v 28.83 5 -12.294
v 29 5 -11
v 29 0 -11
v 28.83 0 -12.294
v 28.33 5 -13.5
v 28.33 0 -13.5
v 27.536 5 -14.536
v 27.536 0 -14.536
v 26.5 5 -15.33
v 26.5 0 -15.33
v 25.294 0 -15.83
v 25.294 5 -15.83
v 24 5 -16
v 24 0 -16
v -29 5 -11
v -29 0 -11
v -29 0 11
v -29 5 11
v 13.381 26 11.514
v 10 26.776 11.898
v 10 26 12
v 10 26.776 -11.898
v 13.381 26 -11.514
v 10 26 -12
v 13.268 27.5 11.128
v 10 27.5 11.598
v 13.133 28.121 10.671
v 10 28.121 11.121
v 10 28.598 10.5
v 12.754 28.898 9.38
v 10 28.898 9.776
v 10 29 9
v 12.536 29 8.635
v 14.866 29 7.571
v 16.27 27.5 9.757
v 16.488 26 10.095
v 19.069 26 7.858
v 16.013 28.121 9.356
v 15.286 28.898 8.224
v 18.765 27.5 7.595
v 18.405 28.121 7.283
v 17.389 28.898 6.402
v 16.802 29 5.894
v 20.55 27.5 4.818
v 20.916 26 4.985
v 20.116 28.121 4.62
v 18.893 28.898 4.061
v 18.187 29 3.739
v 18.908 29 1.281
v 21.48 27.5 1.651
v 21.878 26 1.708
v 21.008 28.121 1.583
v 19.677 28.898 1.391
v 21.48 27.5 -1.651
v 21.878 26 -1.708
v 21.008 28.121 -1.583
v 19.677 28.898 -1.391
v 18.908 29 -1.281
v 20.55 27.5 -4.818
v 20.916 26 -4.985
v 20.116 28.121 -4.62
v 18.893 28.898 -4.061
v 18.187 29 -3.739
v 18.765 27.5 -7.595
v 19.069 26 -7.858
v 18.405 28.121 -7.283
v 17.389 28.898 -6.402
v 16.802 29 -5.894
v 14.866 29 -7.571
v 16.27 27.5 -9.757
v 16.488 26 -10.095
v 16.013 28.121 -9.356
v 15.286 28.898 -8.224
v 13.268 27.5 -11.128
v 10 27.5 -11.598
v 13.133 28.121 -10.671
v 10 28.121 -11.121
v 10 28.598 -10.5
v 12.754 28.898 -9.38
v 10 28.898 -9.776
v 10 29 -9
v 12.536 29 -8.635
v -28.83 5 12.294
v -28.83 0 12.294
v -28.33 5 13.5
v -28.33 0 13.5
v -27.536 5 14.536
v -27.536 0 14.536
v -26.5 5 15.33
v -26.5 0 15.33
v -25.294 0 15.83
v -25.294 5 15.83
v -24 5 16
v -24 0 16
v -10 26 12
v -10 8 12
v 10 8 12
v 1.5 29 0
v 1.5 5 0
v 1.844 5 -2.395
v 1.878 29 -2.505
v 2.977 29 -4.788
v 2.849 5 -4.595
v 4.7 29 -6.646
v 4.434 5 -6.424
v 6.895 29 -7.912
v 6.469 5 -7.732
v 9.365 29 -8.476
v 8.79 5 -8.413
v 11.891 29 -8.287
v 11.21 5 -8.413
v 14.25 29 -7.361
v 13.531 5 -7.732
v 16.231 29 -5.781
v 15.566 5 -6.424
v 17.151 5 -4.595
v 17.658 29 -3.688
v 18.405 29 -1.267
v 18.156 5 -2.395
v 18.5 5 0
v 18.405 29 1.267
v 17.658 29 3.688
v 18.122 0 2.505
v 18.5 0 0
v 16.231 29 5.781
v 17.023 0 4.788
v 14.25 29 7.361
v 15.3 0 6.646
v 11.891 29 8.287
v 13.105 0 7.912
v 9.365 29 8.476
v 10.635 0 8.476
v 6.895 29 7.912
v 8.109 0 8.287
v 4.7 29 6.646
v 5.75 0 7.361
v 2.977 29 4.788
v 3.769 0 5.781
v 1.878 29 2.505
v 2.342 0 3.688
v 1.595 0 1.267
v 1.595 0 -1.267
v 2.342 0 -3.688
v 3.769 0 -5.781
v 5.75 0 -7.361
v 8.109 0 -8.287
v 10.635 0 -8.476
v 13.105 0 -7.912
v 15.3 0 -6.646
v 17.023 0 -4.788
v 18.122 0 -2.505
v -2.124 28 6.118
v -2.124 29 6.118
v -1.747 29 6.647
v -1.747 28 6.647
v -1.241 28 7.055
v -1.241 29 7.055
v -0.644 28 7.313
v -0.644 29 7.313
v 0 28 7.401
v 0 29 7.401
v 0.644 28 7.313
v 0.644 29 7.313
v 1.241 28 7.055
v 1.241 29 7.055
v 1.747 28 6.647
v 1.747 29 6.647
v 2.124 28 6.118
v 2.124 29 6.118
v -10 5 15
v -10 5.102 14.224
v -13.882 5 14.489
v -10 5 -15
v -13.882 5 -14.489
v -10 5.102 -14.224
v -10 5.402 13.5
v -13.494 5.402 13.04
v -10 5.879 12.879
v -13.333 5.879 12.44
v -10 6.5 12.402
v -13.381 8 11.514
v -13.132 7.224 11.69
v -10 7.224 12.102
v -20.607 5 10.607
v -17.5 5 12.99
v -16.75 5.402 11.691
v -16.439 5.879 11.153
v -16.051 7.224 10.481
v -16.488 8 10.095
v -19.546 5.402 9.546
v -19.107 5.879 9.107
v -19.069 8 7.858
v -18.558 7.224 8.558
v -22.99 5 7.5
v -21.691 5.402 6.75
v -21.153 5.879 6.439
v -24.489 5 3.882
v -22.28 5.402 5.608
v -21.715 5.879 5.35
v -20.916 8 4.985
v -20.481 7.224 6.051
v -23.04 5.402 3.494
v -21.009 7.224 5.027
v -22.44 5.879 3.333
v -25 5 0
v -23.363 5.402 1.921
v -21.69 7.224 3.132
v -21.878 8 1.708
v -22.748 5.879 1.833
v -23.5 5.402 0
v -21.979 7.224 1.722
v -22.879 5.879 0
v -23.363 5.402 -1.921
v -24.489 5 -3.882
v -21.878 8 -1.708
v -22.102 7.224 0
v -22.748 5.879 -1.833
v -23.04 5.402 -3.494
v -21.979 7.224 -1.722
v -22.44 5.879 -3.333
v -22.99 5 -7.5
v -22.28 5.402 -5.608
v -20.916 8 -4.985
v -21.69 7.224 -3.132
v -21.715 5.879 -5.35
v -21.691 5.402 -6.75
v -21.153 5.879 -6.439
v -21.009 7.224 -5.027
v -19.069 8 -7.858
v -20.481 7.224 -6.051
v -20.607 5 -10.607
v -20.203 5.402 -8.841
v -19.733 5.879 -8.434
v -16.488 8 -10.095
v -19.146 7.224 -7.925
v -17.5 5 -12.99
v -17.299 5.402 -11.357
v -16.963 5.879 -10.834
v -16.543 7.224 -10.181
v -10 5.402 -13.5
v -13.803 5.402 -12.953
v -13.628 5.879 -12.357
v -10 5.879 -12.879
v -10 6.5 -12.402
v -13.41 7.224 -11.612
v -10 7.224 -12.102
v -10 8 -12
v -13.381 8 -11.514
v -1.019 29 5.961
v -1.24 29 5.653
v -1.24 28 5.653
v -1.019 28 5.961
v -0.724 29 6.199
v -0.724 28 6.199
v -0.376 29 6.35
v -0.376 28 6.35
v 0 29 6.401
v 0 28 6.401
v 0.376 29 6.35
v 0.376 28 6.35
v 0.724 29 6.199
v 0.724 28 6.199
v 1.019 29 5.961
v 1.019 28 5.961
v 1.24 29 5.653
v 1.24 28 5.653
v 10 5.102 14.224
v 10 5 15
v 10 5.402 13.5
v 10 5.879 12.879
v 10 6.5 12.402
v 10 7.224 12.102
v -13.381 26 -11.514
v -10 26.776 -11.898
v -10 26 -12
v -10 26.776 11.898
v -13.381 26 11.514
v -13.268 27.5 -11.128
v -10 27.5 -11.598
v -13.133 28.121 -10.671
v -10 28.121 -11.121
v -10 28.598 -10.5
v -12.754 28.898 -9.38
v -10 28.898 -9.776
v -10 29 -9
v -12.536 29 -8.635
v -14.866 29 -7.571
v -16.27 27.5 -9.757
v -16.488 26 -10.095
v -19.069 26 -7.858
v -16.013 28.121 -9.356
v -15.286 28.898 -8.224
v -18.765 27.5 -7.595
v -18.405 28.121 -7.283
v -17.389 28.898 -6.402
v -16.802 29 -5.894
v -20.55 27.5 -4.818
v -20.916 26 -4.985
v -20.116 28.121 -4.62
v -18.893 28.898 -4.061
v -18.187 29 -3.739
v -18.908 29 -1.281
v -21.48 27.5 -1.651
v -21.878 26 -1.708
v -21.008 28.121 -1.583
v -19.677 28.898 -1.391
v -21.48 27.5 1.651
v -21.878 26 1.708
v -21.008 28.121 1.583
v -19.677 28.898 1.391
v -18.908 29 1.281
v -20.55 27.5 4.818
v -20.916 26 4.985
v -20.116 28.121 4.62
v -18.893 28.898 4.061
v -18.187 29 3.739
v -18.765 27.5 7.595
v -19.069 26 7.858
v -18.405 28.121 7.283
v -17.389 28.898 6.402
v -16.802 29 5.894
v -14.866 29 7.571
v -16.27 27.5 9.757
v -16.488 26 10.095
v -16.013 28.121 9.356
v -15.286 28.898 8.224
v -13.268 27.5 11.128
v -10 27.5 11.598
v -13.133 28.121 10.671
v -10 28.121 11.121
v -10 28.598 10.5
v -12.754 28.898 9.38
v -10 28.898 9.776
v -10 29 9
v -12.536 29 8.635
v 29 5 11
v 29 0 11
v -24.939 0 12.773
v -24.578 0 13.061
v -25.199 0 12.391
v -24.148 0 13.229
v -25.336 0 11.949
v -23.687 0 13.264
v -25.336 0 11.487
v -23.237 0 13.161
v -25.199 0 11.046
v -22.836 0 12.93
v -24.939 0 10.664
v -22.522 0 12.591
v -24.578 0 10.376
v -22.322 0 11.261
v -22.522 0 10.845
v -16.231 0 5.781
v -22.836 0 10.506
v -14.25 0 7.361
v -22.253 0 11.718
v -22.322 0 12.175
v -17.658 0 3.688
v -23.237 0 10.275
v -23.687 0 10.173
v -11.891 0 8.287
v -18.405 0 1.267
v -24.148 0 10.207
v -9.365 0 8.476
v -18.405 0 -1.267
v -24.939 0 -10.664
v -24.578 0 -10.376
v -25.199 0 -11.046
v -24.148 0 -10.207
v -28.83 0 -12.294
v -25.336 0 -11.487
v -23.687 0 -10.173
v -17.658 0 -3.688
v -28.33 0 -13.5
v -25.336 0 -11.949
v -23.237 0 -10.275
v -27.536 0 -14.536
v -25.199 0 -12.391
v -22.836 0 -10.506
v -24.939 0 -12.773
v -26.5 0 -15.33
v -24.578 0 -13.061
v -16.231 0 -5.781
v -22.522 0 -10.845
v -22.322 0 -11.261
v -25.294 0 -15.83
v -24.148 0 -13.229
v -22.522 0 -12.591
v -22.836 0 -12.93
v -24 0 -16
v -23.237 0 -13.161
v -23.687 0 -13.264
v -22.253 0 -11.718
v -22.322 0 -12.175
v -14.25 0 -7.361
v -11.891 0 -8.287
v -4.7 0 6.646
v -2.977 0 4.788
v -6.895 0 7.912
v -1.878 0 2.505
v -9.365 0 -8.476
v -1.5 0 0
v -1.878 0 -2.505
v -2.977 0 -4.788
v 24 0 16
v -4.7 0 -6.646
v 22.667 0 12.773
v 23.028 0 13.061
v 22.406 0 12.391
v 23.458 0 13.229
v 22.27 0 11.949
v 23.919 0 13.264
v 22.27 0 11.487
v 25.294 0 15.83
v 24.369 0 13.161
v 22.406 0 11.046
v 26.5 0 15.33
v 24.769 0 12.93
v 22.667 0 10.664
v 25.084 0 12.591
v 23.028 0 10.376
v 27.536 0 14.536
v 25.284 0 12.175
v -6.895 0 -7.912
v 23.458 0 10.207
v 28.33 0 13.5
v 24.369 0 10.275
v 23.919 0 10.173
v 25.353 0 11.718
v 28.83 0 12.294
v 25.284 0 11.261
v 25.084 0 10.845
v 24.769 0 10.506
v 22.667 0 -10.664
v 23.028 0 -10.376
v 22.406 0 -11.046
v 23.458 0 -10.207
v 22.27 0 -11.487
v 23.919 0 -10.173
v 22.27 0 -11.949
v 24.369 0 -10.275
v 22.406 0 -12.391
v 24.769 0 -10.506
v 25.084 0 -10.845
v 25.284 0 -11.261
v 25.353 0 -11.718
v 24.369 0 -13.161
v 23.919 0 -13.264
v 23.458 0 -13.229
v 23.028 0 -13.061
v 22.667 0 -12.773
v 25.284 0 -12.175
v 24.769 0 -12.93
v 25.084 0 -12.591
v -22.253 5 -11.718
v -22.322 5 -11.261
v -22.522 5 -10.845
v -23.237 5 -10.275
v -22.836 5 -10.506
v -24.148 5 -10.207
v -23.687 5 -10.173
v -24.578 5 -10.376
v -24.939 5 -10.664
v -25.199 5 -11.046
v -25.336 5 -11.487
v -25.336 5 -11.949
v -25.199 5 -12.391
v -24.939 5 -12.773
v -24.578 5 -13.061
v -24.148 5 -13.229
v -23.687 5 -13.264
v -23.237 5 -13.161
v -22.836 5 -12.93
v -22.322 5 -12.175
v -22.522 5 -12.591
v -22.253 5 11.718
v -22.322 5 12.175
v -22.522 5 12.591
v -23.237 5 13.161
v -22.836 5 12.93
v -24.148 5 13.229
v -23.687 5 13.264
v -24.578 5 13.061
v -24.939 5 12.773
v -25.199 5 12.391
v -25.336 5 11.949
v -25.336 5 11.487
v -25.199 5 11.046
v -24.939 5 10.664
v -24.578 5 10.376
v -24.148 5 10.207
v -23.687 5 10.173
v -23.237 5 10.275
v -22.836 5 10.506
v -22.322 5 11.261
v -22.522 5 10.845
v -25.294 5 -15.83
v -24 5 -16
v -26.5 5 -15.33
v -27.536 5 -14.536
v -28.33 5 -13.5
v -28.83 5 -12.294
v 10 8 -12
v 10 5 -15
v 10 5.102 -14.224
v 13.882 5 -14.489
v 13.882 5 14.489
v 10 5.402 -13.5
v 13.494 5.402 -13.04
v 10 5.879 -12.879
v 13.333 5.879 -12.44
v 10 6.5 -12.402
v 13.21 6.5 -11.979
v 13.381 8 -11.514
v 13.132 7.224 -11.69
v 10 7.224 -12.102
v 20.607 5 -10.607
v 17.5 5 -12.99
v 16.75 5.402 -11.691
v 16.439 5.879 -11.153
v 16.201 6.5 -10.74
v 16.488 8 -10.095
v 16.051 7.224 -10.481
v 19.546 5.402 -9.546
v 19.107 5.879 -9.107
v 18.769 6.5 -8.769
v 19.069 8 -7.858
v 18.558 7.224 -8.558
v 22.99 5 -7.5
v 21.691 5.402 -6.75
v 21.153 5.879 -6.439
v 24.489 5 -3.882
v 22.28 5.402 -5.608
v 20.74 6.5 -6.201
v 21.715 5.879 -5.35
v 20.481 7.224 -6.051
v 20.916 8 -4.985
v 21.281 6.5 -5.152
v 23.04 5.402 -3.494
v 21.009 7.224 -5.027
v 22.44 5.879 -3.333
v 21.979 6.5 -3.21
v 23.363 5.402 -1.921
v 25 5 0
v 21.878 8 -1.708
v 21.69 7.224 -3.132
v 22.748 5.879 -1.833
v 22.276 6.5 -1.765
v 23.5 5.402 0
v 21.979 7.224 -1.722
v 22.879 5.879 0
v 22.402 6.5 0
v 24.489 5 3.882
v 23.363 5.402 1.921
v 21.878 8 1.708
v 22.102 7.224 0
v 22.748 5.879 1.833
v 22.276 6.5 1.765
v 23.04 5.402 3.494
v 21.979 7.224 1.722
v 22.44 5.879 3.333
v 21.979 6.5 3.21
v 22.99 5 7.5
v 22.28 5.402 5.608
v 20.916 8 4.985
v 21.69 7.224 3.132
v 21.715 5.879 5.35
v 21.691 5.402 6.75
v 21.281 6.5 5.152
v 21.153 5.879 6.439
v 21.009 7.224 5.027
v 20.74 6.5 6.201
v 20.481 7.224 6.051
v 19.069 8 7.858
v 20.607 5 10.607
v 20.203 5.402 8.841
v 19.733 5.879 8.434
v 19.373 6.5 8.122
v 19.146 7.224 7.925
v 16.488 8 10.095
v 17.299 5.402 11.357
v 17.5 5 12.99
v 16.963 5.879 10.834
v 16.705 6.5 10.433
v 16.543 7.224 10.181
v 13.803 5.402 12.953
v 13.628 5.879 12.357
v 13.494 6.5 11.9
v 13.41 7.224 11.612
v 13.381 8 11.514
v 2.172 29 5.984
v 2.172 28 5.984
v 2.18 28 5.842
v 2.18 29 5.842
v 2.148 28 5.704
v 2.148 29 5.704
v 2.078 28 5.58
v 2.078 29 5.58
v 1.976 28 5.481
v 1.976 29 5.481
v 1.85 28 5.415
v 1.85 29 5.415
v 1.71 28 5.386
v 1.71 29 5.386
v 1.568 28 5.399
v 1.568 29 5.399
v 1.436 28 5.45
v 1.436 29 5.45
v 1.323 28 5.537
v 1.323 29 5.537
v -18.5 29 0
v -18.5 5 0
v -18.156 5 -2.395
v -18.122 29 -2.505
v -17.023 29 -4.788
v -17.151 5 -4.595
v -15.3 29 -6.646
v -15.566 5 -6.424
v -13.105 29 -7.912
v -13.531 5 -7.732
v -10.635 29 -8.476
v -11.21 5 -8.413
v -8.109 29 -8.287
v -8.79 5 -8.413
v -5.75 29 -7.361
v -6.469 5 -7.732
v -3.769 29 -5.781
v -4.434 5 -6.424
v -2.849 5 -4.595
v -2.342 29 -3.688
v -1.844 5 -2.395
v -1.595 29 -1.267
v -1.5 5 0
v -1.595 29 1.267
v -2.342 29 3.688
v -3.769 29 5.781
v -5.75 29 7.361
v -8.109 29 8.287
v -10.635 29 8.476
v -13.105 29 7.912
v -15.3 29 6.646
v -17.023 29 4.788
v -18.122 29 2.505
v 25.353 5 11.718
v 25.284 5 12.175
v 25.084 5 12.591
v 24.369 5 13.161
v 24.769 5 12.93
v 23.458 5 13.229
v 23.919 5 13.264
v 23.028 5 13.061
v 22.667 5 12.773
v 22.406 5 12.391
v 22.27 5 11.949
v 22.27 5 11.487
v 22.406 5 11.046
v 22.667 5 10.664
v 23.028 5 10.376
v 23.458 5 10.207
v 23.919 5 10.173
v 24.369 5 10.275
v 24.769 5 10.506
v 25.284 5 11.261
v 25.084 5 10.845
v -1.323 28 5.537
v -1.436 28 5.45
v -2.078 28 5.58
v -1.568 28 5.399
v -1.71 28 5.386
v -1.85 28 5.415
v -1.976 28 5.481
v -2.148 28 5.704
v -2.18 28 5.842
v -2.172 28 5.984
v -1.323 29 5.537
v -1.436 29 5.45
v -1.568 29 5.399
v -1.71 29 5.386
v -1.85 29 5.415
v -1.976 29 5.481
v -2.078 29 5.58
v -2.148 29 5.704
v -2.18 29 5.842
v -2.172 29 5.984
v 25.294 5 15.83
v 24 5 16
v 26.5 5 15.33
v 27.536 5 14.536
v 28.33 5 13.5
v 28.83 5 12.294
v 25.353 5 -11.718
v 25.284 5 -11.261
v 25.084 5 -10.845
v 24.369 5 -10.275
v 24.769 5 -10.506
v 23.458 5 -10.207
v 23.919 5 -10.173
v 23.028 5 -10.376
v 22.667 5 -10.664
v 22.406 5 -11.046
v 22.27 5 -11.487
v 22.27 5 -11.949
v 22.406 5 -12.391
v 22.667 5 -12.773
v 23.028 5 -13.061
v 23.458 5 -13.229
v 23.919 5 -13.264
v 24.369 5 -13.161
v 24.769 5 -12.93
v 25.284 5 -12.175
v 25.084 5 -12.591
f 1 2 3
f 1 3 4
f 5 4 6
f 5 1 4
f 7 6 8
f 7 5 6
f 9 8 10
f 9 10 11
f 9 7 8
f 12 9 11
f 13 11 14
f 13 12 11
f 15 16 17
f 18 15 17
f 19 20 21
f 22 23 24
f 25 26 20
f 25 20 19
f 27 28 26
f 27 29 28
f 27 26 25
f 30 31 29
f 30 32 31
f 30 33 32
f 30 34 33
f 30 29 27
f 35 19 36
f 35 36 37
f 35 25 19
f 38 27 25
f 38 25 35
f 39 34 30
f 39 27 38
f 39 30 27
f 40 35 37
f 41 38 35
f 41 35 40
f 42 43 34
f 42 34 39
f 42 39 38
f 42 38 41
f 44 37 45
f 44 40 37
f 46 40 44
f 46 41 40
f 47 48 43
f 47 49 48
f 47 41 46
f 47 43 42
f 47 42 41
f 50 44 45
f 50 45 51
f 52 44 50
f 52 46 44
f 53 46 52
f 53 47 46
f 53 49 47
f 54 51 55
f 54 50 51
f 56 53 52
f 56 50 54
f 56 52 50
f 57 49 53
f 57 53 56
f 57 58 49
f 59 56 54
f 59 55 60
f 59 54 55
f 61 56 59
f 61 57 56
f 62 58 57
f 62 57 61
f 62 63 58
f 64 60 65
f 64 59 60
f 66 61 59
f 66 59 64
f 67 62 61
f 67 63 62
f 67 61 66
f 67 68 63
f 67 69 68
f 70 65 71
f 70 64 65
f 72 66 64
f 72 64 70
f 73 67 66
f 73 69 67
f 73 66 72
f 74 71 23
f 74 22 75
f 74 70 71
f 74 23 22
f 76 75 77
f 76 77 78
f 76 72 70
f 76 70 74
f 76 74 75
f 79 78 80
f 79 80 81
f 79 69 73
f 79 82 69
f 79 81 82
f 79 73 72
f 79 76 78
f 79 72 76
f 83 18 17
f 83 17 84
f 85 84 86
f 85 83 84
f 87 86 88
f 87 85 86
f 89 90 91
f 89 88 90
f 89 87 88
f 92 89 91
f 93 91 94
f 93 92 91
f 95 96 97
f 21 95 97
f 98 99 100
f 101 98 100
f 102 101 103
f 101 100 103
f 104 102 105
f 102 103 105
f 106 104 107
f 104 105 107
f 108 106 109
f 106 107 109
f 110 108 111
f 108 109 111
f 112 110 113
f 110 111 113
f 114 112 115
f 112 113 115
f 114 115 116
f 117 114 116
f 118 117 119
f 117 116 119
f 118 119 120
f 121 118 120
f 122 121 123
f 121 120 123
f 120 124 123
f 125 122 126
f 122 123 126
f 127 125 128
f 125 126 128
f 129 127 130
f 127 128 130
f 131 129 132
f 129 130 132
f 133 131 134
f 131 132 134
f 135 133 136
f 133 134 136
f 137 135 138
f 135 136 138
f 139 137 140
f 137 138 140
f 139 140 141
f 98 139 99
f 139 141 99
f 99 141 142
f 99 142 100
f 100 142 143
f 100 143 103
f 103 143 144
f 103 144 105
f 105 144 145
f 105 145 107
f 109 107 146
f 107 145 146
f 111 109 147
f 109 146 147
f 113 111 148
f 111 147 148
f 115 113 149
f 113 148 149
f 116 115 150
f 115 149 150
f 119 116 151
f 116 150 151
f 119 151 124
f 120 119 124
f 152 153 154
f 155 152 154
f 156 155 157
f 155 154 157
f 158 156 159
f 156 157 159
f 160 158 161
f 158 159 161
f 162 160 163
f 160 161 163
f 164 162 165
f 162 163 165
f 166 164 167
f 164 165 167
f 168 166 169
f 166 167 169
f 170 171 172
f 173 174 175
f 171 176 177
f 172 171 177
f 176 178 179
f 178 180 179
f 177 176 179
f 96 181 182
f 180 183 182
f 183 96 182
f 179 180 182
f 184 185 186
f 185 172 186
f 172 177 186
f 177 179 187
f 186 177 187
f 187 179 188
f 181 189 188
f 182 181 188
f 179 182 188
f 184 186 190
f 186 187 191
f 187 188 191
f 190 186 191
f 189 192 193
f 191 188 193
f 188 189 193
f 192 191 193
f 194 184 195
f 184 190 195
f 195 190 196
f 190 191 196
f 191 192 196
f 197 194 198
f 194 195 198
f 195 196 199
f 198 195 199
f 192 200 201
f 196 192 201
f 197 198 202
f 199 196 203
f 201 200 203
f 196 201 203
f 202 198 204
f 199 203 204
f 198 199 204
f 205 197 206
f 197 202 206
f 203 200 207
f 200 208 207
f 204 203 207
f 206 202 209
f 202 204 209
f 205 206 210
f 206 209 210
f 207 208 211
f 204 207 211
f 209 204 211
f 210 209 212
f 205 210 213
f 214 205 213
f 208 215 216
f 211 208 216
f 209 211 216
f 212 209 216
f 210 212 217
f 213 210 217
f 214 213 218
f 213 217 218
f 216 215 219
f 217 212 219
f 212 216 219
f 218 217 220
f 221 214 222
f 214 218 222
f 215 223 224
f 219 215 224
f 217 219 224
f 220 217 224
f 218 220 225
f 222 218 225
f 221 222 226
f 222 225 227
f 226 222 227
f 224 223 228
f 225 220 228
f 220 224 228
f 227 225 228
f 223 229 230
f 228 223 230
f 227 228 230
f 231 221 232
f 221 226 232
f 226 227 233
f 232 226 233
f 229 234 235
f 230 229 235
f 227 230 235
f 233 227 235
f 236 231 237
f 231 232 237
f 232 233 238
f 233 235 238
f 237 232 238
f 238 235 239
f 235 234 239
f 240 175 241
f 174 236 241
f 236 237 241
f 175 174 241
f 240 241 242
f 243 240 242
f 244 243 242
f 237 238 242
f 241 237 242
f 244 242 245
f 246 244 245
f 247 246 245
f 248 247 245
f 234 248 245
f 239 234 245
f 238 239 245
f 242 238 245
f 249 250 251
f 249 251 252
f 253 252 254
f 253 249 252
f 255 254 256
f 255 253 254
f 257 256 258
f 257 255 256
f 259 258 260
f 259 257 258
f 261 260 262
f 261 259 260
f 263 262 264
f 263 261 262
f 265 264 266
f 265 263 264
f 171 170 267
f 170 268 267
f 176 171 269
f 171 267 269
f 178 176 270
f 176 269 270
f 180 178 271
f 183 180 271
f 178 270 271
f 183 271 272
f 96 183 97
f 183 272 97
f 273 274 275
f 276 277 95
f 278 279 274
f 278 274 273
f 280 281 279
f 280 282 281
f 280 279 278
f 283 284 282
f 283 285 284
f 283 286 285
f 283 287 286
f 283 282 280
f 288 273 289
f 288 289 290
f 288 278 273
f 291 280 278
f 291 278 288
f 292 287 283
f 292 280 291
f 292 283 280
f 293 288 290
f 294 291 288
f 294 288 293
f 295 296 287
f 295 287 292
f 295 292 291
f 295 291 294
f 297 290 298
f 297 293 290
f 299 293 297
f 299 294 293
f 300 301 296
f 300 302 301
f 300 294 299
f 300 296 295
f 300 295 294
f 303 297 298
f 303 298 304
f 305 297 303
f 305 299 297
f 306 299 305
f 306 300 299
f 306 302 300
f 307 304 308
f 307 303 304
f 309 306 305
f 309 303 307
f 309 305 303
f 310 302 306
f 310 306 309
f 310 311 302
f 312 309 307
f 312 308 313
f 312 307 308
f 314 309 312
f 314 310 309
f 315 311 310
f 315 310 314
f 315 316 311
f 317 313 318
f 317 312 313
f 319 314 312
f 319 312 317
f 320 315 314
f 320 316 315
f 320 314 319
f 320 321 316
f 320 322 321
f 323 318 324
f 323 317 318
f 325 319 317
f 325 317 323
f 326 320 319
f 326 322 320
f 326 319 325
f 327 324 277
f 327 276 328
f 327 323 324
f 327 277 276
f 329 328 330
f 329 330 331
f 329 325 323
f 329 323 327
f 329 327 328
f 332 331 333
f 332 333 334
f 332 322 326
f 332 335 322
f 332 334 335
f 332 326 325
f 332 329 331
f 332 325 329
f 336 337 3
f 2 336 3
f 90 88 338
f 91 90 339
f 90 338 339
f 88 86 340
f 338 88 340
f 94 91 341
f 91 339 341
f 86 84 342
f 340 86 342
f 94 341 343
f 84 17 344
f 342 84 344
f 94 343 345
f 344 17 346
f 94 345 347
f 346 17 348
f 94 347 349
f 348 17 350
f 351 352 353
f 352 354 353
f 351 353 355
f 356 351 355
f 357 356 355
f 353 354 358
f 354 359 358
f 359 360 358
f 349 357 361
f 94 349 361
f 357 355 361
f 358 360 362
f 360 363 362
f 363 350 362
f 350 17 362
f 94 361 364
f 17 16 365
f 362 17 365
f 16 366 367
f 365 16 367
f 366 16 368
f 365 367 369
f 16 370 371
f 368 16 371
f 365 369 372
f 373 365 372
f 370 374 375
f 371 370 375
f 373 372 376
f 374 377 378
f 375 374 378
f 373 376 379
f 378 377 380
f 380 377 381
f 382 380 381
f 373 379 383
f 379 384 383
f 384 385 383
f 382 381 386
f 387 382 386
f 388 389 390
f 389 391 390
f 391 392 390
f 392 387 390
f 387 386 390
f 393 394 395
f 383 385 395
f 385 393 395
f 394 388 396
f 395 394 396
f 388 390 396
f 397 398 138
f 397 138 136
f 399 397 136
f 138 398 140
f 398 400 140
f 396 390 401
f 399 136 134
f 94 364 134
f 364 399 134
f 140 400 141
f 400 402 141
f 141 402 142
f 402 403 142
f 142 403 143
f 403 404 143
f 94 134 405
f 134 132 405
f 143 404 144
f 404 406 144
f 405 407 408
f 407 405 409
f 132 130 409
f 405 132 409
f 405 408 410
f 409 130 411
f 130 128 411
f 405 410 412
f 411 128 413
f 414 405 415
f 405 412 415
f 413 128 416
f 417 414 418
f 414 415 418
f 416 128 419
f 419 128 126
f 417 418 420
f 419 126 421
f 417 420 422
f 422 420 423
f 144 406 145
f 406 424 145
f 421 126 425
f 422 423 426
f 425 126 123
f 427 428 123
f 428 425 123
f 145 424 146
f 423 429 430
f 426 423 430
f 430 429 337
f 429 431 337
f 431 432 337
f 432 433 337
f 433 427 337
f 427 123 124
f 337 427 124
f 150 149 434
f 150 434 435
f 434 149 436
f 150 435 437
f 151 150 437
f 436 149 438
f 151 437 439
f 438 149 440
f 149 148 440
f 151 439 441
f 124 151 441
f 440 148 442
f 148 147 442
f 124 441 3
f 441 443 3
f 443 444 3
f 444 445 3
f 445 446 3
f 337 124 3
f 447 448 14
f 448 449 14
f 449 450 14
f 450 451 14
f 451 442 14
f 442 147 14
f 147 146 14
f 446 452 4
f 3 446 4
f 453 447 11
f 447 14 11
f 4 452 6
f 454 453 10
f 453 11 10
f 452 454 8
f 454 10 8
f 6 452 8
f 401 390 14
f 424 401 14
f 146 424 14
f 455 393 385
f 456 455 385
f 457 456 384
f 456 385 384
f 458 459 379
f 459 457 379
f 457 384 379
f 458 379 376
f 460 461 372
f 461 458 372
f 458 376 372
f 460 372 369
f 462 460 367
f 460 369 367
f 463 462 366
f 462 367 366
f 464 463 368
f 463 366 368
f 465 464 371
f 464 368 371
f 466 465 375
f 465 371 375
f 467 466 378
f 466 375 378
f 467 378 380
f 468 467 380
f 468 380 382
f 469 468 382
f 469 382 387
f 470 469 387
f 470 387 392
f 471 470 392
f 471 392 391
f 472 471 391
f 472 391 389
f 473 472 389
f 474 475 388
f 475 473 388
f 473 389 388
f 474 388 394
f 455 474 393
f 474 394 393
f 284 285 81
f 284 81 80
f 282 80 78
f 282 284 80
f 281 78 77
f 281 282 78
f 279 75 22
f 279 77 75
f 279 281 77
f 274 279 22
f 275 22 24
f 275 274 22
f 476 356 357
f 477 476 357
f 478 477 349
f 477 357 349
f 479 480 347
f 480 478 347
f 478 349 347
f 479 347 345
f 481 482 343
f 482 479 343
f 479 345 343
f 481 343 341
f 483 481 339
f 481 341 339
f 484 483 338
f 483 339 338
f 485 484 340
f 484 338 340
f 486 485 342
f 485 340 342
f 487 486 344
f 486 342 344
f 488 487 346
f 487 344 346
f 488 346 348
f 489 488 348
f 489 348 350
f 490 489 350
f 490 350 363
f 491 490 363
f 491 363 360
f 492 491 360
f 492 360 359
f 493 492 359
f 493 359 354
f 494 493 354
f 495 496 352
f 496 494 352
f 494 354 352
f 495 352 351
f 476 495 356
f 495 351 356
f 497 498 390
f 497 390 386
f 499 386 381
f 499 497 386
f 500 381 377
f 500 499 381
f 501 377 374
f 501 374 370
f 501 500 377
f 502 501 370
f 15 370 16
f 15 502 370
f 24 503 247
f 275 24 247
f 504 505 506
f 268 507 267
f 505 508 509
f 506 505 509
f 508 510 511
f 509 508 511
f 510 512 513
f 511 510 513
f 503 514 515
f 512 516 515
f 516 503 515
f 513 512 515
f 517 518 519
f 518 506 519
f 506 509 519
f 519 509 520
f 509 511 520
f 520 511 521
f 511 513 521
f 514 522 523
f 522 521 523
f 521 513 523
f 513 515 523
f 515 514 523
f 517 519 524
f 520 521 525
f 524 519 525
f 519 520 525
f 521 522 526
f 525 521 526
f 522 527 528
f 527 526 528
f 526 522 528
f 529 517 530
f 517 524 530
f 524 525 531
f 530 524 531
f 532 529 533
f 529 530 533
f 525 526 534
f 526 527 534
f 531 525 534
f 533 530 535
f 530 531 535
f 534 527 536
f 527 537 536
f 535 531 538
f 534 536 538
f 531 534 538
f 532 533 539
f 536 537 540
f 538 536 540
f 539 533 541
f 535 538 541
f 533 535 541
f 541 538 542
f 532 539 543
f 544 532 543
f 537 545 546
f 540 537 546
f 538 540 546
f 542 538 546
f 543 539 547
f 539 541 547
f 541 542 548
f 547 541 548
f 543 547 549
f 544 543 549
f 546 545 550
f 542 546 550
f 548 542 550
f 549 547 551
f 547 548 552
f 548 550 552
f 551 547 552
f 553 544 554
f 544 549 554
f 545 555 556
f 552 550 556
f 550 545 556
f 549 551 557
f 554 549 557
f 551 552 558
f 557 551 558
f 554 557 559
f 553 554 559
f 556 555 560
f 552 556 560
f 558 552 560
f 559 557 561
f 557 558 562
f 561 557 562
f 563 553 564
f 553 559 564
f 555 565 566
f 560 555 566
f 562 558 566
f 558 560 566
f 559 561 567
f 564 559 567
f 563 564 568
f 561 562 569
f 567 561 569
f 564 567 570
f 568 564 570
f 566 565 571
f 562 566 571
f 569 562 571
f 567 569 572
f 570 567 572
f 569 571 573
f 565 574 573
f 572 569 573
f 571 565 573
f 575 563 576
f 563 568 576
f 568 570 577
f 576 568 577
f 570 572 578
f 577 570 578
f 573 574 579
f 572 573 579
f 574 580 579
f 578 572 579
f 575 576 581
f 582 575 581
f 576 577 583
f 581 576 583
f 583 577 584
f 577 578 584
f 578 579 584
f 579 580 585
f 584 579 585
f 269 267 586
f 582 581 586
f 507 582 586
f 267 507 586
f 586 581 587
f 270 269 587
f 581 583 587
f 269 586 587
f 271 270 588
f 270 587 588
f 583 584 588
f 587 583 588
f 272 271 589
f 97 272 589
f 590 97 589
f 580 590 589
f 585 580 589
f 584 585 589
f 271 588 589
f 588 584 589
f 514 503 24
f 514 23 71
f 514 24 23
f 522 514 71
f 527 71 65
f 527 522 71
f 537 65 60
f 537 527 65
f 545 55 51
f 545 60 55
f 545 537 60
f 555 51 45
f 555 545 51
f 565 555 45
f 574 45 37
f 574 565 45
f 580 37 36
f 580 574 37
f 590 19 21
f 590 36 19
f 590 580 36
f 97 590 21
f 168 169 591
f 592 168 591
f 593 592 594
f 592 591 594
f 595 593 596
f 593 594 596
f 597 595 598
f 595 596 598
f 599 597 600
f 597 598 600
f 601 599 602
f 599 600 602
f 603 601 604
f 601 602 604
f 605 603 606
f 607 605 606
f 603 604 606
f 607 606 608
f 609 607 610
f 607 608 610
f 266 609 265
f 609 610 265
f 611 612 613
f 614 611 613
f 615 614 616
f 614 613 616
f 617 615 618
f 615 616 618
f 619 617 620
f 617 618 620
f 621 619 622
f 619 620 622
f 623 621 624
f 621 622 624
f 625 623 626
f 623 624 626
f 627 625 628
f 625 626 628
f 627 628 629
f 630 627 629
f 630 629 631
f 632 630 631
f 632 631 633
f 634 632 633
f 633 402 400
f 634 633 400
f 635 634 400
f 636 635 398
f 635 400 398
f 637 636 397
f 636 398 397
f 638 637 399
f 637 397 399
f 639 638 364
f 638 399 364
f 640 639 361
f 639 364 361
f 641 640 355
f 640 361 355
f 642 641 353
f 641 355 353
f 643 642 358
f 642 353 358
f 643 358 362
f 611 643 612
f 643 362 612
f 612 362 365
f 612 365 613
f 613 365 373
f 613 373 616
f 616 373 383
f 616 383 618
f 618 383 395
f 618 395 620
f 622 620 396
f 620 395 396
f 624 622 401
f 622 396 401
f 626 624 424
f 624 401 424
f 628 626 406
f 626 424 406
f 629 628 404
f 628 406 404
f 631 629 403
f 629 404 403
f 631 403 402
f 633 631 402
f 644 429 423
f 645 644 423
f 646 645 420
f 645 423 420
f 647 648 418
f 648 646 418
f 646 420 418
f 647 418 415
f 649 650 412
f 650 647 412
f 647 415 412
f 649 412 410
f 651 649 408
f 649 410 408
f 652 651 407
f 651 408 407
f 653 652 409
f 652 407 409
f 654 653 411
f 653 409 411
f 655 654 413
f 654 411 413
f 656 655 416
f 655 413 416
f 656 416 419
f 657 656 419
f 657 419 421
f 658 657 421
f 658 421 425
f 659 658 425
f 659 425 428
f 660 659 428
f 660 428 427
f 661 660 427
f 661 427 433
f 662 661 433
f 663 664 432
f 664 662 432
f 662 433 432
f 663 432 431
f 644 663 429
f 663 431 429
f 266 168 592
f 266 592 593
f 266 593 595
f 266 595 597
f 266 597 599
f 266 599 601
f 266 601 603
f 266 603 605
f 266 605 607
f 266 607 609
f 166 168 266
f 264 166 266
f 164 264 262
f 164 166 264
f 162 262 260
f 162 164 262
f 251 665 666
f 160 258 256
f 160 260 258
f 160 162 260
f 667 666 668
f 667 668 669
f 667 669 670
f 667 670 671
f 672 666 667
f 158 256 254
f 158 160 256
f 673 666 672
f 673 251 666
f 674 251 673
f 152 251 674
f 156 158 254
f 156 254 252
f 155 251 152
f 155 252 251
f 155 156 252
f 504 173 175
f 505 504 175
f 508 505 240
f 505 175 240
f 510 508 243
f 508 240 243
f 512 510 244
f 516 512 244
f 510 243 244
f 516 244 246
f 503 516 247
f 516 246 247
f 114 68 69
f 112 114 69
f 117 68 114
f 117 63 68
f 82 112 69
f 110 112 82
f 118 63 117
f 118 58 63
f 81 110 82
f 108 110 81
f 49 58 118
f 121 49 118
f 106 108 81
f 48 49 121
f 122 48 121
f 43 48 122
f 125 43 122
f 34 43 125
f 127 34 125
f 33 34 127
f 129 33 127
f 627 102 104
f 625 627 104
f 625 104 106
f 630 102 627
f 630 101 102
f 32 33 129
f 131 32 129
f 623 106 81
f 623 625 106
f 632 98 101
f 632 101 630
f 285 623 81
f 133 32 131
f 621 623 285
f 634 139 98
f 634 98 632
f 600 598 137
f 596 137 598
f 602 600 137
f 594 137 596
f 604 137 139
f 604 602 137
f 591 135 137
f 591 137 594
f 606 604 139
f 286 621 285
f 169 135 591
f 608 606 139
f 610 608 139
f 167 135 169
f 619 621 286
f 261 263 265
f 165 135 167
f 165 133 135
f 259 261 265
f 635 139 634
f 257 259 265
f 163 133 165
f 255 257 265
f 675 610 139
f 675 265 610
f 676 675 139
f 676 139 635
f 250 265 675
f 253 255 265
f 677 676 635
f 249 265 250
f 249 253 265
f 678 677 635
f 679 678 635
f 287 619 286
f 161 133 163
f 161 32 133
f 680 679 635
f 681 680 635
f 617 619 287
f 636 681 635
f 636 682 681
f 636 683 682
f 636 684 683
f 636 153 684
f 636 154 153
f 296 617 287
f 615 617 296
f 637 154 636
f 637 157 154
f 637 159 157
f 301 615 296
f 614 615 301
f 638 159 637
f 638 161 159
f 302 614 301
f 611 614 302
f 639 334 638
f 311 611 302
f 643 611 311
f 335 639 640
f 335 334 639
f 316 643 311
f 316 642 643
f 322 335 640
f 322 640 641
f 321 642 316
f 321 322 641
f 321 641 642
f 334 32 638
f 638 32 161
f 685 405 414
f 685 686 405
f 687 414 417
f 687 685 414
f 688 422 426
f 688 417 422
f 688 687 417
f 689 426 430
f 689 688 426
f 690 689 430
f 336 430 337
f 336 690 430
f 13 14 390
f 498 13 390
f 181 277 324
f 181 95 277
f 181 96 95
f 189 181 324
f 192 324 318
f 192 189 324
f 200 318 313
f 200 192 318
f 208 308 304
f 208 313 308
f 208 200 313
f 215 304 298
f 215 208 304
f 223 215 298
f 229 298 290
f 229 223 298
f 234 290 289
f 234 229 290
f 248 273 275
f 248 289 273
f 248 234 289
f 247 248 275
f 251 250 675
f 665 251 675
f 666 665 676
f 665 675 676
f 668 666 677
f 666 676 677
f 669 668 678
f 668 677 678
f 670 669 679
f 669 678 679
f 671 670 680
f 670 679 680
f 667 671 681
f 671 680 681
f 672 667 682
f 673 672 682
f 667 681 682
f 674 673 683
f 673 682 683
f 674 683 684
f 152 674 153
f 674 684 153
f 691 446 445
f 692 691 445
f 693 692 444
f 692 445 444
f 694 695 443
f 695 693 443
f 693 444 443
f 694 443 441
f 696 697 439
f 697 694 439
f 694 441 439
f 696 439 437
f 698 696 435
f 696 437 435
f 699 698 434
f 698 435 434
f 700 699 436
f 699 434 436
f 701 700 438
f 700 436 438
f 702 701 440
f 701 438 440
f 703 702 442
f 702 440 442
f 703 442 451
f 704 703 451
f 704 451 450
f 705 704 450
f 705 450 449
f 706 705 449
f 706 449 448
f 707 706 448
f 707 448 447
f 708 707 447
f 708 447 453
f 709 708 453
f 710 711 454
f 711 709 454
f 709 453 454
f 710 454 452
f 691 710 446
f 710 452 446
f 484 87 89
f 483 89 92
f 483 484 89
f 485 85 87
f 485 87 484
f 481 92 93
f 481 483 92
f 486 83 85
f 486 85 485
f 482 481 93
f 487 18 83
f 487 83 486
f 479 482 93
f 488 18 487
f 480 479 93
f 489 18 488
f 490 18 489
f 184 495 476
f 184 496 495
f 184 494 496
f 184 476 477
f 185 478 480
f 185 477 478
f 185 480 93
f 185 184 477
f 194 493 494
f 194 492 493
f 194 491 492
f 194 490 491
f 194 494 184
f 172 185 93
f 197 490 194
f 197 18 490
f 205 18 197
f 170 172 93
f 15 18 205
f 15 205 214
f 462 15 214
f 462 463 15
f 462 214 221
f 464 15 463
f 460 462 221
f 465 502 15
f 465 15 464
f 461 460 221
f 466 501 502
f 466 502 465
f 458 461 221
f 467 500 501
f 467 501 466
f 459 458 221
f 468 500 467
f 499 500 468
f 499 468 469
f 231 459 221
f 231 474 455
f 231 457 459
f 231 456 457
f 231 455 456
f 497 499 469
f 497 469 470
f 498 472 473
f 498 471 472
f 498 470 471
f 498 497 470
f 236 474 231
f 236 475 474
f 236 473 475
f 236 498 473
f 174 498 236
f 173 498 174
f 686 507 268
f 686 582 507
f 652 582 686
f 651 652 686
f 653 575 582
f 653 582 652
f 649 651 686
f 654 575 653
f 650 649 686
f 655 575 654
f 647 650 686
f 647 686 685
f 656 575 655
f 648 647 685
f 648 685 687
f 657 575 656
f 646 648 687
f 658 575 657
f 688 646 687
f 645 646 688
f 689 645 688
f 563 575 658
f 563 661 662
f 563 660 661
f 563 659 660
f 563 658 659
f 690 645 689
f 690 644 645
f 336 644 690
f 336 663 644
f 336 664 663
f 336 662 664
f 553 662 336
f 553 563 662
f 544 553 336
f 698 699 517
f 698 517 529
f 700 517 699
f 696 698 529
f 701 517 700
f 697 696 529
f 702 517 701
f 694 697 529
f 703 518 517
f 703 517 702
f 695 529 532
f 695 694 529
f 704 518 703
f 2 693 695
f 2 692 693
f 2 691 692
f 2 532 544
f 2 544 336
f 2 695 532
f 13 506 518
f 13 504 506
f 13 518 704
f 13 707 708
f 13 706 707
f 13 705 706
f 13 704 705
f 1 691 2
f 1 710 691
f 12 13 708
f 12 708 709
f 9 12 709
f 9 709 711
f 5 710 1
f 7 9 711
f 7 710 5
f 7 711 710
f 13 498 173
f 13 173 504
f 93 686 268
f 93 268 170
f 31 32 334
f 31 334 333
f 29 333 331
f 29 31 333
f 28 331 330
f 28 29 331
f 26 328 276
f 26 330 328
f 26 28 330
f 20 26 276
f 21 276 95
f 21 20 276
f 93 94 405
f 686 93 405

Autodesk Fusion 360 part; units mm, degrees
sketch "Sketch1" plane through (0, 0, 0) normal (0, 1, 0) x (1, 0, 0)
  line L0 (29, 16) -> (-29, 16)
  line L1 (-29, 16) -> (-29, -16)
  line L2 (-29, -16) -> (29, -16)
  line L3 (29, -16) -> (29, 16)
  line L4 (23.8029, 11.7183) -> (-23.8029, 11.7183) construction
  line L5 (-23.8029, 11.7183) -> (-23.8029, -11.7183) construction
  line L6 (-23.8029, -11.7183) -> (23.8029, -11.7183) construction
  line L7 (23.8029, -11.7183) -> (23.8029, 11.7183) construction
  line L8 (23.8029, 11.7183) -> (-23.8029, -11.7183) construction
  line L9 (-23.8029, 11.7183) -> (23.8029, -11.7183) construction
  circle A0 centre (-23.8029, 11.7183) radius 1.55
  circle A1 centre (23.8029, 11.7183) radius 1.55
  circle A2 centre (23.8029, -11.7183) radius 1.55
  circle A3 centre (-23.8029, -11.7183) radius 1.55
  line L10 (-10, 0) -> (10, 0) construction
  circle A4 centre (-10, 0) radius 8.5
  circle A5 centre (10, 0) radius 8.5
  line L11 (0, 11.7183) -> (0, 16) construction
  dimension "d2" = 32
  dimension "d4" = 3.1
  dimension "d5" = 17
  dimension "d6" = 20
  dimension "d7" = 58
extrude "Extrude1" add sketch "Sketch1" along normal blind 5
sketch "Sketch2" plane through (0, 5, 0) normal (0, 1, 0) x (-1, 0, 0)
  circle A0 centre (-23.8029, -11.7183) radius 1.55
  circle A1 centre (23.8029, -11.7183) radius 1.55
  circle A2 centre (-23.8029, 11.7183) radius 1.55
  circle A3 centre (23.8029, 11.7183) radius 1.55
  circle A4 centre (10, 0) radius 8.5
  circle A5 centre (-10, 0) radius 8.5
  line L0 (-29, 16) -> (-29, -16)
  line L1 (-29, -16) -> (29, -16)
  line L2 (29, -16) -> (29, 16)
  line L3 (29, 16) -> (-29, 16)
  line L4 (10, 12) -> (-10, 12)
  arc A6 (-10, 12) -> (-10, -12) centre (-10, 0) ccw
  line L5 (-10, -12) -> (10, -12)
  arc A7 (10, -12) -> (10, 12) centre (10, 0) ccw
  line L6 (10, 0) -> (-10, 0) construction
  dimension "d10" = 20
  dimension "d11" = 12
extrude "Extrude2" add sketch "Sketch2" along normal blind 24 contours L4 A6 L5 A7
fillet "Fillet1" radius 5 4 edges at (-29, 2.5, 16) (-29, 2.5, -16) (29, 2.5, -16) (29, 2.5, 16)
fillet "Fillet2" radius 3 4 faces at (-3.3333, 13, 12) (20.0803, 13, -6.5106) (3.3333, 13, -12) (-17.2457, 21, -9.5656)
sketch "Sketch3" plane through (0, 29, 0) normal (0, 1, 0) x (-1, 0, 0)
  circle A0 centre (-10, 0) radius 8.5
  circle A1 centre (10, 0) radius 8.5
  line L0 (10, 9) -> (-10, 9)
  arc A2 (-10, 9) -> (-10, -9) centre (-10, 0) ccw
  line L1 (-10, -9) -> (10, -9)
  arc A3 (10, -9) -> (10, 9) centre (10, 0) ccw
  arc A4 (1.2397, 5.6527) -> (-1.2397, 5.6527) centre (0, 5) ccw
  arc A5 (1.2397, 5.6527) -> (2.1245, 6.1185) centre (1.6821, 5.8856) ccw
  arc A6 (2.1245, 6.1185) -> (-2.1245, 6.1185) centre (0, 5) ccw
  arc A7 (-2.1245, 6.1185) -> (-1.2397, 5.6527) centre (-1.6821, 5.8856) ccw
  arc A8 (1.6821, 5.8856) -> (-1.6821, 5.8856) centre (0, 5) ccw construction
  line L2 (0, 5) -> (0, 0) construction
  line L3 (1.6821, 5.8856) -> (-1.6821, 5.8856) construction
  dimension "d18" = 0.5
  dimension "d19" = 5
extrude "Extrude3" cut sketch "Sketch3" against normal blind 1 contours A4 A5 A6 A7
